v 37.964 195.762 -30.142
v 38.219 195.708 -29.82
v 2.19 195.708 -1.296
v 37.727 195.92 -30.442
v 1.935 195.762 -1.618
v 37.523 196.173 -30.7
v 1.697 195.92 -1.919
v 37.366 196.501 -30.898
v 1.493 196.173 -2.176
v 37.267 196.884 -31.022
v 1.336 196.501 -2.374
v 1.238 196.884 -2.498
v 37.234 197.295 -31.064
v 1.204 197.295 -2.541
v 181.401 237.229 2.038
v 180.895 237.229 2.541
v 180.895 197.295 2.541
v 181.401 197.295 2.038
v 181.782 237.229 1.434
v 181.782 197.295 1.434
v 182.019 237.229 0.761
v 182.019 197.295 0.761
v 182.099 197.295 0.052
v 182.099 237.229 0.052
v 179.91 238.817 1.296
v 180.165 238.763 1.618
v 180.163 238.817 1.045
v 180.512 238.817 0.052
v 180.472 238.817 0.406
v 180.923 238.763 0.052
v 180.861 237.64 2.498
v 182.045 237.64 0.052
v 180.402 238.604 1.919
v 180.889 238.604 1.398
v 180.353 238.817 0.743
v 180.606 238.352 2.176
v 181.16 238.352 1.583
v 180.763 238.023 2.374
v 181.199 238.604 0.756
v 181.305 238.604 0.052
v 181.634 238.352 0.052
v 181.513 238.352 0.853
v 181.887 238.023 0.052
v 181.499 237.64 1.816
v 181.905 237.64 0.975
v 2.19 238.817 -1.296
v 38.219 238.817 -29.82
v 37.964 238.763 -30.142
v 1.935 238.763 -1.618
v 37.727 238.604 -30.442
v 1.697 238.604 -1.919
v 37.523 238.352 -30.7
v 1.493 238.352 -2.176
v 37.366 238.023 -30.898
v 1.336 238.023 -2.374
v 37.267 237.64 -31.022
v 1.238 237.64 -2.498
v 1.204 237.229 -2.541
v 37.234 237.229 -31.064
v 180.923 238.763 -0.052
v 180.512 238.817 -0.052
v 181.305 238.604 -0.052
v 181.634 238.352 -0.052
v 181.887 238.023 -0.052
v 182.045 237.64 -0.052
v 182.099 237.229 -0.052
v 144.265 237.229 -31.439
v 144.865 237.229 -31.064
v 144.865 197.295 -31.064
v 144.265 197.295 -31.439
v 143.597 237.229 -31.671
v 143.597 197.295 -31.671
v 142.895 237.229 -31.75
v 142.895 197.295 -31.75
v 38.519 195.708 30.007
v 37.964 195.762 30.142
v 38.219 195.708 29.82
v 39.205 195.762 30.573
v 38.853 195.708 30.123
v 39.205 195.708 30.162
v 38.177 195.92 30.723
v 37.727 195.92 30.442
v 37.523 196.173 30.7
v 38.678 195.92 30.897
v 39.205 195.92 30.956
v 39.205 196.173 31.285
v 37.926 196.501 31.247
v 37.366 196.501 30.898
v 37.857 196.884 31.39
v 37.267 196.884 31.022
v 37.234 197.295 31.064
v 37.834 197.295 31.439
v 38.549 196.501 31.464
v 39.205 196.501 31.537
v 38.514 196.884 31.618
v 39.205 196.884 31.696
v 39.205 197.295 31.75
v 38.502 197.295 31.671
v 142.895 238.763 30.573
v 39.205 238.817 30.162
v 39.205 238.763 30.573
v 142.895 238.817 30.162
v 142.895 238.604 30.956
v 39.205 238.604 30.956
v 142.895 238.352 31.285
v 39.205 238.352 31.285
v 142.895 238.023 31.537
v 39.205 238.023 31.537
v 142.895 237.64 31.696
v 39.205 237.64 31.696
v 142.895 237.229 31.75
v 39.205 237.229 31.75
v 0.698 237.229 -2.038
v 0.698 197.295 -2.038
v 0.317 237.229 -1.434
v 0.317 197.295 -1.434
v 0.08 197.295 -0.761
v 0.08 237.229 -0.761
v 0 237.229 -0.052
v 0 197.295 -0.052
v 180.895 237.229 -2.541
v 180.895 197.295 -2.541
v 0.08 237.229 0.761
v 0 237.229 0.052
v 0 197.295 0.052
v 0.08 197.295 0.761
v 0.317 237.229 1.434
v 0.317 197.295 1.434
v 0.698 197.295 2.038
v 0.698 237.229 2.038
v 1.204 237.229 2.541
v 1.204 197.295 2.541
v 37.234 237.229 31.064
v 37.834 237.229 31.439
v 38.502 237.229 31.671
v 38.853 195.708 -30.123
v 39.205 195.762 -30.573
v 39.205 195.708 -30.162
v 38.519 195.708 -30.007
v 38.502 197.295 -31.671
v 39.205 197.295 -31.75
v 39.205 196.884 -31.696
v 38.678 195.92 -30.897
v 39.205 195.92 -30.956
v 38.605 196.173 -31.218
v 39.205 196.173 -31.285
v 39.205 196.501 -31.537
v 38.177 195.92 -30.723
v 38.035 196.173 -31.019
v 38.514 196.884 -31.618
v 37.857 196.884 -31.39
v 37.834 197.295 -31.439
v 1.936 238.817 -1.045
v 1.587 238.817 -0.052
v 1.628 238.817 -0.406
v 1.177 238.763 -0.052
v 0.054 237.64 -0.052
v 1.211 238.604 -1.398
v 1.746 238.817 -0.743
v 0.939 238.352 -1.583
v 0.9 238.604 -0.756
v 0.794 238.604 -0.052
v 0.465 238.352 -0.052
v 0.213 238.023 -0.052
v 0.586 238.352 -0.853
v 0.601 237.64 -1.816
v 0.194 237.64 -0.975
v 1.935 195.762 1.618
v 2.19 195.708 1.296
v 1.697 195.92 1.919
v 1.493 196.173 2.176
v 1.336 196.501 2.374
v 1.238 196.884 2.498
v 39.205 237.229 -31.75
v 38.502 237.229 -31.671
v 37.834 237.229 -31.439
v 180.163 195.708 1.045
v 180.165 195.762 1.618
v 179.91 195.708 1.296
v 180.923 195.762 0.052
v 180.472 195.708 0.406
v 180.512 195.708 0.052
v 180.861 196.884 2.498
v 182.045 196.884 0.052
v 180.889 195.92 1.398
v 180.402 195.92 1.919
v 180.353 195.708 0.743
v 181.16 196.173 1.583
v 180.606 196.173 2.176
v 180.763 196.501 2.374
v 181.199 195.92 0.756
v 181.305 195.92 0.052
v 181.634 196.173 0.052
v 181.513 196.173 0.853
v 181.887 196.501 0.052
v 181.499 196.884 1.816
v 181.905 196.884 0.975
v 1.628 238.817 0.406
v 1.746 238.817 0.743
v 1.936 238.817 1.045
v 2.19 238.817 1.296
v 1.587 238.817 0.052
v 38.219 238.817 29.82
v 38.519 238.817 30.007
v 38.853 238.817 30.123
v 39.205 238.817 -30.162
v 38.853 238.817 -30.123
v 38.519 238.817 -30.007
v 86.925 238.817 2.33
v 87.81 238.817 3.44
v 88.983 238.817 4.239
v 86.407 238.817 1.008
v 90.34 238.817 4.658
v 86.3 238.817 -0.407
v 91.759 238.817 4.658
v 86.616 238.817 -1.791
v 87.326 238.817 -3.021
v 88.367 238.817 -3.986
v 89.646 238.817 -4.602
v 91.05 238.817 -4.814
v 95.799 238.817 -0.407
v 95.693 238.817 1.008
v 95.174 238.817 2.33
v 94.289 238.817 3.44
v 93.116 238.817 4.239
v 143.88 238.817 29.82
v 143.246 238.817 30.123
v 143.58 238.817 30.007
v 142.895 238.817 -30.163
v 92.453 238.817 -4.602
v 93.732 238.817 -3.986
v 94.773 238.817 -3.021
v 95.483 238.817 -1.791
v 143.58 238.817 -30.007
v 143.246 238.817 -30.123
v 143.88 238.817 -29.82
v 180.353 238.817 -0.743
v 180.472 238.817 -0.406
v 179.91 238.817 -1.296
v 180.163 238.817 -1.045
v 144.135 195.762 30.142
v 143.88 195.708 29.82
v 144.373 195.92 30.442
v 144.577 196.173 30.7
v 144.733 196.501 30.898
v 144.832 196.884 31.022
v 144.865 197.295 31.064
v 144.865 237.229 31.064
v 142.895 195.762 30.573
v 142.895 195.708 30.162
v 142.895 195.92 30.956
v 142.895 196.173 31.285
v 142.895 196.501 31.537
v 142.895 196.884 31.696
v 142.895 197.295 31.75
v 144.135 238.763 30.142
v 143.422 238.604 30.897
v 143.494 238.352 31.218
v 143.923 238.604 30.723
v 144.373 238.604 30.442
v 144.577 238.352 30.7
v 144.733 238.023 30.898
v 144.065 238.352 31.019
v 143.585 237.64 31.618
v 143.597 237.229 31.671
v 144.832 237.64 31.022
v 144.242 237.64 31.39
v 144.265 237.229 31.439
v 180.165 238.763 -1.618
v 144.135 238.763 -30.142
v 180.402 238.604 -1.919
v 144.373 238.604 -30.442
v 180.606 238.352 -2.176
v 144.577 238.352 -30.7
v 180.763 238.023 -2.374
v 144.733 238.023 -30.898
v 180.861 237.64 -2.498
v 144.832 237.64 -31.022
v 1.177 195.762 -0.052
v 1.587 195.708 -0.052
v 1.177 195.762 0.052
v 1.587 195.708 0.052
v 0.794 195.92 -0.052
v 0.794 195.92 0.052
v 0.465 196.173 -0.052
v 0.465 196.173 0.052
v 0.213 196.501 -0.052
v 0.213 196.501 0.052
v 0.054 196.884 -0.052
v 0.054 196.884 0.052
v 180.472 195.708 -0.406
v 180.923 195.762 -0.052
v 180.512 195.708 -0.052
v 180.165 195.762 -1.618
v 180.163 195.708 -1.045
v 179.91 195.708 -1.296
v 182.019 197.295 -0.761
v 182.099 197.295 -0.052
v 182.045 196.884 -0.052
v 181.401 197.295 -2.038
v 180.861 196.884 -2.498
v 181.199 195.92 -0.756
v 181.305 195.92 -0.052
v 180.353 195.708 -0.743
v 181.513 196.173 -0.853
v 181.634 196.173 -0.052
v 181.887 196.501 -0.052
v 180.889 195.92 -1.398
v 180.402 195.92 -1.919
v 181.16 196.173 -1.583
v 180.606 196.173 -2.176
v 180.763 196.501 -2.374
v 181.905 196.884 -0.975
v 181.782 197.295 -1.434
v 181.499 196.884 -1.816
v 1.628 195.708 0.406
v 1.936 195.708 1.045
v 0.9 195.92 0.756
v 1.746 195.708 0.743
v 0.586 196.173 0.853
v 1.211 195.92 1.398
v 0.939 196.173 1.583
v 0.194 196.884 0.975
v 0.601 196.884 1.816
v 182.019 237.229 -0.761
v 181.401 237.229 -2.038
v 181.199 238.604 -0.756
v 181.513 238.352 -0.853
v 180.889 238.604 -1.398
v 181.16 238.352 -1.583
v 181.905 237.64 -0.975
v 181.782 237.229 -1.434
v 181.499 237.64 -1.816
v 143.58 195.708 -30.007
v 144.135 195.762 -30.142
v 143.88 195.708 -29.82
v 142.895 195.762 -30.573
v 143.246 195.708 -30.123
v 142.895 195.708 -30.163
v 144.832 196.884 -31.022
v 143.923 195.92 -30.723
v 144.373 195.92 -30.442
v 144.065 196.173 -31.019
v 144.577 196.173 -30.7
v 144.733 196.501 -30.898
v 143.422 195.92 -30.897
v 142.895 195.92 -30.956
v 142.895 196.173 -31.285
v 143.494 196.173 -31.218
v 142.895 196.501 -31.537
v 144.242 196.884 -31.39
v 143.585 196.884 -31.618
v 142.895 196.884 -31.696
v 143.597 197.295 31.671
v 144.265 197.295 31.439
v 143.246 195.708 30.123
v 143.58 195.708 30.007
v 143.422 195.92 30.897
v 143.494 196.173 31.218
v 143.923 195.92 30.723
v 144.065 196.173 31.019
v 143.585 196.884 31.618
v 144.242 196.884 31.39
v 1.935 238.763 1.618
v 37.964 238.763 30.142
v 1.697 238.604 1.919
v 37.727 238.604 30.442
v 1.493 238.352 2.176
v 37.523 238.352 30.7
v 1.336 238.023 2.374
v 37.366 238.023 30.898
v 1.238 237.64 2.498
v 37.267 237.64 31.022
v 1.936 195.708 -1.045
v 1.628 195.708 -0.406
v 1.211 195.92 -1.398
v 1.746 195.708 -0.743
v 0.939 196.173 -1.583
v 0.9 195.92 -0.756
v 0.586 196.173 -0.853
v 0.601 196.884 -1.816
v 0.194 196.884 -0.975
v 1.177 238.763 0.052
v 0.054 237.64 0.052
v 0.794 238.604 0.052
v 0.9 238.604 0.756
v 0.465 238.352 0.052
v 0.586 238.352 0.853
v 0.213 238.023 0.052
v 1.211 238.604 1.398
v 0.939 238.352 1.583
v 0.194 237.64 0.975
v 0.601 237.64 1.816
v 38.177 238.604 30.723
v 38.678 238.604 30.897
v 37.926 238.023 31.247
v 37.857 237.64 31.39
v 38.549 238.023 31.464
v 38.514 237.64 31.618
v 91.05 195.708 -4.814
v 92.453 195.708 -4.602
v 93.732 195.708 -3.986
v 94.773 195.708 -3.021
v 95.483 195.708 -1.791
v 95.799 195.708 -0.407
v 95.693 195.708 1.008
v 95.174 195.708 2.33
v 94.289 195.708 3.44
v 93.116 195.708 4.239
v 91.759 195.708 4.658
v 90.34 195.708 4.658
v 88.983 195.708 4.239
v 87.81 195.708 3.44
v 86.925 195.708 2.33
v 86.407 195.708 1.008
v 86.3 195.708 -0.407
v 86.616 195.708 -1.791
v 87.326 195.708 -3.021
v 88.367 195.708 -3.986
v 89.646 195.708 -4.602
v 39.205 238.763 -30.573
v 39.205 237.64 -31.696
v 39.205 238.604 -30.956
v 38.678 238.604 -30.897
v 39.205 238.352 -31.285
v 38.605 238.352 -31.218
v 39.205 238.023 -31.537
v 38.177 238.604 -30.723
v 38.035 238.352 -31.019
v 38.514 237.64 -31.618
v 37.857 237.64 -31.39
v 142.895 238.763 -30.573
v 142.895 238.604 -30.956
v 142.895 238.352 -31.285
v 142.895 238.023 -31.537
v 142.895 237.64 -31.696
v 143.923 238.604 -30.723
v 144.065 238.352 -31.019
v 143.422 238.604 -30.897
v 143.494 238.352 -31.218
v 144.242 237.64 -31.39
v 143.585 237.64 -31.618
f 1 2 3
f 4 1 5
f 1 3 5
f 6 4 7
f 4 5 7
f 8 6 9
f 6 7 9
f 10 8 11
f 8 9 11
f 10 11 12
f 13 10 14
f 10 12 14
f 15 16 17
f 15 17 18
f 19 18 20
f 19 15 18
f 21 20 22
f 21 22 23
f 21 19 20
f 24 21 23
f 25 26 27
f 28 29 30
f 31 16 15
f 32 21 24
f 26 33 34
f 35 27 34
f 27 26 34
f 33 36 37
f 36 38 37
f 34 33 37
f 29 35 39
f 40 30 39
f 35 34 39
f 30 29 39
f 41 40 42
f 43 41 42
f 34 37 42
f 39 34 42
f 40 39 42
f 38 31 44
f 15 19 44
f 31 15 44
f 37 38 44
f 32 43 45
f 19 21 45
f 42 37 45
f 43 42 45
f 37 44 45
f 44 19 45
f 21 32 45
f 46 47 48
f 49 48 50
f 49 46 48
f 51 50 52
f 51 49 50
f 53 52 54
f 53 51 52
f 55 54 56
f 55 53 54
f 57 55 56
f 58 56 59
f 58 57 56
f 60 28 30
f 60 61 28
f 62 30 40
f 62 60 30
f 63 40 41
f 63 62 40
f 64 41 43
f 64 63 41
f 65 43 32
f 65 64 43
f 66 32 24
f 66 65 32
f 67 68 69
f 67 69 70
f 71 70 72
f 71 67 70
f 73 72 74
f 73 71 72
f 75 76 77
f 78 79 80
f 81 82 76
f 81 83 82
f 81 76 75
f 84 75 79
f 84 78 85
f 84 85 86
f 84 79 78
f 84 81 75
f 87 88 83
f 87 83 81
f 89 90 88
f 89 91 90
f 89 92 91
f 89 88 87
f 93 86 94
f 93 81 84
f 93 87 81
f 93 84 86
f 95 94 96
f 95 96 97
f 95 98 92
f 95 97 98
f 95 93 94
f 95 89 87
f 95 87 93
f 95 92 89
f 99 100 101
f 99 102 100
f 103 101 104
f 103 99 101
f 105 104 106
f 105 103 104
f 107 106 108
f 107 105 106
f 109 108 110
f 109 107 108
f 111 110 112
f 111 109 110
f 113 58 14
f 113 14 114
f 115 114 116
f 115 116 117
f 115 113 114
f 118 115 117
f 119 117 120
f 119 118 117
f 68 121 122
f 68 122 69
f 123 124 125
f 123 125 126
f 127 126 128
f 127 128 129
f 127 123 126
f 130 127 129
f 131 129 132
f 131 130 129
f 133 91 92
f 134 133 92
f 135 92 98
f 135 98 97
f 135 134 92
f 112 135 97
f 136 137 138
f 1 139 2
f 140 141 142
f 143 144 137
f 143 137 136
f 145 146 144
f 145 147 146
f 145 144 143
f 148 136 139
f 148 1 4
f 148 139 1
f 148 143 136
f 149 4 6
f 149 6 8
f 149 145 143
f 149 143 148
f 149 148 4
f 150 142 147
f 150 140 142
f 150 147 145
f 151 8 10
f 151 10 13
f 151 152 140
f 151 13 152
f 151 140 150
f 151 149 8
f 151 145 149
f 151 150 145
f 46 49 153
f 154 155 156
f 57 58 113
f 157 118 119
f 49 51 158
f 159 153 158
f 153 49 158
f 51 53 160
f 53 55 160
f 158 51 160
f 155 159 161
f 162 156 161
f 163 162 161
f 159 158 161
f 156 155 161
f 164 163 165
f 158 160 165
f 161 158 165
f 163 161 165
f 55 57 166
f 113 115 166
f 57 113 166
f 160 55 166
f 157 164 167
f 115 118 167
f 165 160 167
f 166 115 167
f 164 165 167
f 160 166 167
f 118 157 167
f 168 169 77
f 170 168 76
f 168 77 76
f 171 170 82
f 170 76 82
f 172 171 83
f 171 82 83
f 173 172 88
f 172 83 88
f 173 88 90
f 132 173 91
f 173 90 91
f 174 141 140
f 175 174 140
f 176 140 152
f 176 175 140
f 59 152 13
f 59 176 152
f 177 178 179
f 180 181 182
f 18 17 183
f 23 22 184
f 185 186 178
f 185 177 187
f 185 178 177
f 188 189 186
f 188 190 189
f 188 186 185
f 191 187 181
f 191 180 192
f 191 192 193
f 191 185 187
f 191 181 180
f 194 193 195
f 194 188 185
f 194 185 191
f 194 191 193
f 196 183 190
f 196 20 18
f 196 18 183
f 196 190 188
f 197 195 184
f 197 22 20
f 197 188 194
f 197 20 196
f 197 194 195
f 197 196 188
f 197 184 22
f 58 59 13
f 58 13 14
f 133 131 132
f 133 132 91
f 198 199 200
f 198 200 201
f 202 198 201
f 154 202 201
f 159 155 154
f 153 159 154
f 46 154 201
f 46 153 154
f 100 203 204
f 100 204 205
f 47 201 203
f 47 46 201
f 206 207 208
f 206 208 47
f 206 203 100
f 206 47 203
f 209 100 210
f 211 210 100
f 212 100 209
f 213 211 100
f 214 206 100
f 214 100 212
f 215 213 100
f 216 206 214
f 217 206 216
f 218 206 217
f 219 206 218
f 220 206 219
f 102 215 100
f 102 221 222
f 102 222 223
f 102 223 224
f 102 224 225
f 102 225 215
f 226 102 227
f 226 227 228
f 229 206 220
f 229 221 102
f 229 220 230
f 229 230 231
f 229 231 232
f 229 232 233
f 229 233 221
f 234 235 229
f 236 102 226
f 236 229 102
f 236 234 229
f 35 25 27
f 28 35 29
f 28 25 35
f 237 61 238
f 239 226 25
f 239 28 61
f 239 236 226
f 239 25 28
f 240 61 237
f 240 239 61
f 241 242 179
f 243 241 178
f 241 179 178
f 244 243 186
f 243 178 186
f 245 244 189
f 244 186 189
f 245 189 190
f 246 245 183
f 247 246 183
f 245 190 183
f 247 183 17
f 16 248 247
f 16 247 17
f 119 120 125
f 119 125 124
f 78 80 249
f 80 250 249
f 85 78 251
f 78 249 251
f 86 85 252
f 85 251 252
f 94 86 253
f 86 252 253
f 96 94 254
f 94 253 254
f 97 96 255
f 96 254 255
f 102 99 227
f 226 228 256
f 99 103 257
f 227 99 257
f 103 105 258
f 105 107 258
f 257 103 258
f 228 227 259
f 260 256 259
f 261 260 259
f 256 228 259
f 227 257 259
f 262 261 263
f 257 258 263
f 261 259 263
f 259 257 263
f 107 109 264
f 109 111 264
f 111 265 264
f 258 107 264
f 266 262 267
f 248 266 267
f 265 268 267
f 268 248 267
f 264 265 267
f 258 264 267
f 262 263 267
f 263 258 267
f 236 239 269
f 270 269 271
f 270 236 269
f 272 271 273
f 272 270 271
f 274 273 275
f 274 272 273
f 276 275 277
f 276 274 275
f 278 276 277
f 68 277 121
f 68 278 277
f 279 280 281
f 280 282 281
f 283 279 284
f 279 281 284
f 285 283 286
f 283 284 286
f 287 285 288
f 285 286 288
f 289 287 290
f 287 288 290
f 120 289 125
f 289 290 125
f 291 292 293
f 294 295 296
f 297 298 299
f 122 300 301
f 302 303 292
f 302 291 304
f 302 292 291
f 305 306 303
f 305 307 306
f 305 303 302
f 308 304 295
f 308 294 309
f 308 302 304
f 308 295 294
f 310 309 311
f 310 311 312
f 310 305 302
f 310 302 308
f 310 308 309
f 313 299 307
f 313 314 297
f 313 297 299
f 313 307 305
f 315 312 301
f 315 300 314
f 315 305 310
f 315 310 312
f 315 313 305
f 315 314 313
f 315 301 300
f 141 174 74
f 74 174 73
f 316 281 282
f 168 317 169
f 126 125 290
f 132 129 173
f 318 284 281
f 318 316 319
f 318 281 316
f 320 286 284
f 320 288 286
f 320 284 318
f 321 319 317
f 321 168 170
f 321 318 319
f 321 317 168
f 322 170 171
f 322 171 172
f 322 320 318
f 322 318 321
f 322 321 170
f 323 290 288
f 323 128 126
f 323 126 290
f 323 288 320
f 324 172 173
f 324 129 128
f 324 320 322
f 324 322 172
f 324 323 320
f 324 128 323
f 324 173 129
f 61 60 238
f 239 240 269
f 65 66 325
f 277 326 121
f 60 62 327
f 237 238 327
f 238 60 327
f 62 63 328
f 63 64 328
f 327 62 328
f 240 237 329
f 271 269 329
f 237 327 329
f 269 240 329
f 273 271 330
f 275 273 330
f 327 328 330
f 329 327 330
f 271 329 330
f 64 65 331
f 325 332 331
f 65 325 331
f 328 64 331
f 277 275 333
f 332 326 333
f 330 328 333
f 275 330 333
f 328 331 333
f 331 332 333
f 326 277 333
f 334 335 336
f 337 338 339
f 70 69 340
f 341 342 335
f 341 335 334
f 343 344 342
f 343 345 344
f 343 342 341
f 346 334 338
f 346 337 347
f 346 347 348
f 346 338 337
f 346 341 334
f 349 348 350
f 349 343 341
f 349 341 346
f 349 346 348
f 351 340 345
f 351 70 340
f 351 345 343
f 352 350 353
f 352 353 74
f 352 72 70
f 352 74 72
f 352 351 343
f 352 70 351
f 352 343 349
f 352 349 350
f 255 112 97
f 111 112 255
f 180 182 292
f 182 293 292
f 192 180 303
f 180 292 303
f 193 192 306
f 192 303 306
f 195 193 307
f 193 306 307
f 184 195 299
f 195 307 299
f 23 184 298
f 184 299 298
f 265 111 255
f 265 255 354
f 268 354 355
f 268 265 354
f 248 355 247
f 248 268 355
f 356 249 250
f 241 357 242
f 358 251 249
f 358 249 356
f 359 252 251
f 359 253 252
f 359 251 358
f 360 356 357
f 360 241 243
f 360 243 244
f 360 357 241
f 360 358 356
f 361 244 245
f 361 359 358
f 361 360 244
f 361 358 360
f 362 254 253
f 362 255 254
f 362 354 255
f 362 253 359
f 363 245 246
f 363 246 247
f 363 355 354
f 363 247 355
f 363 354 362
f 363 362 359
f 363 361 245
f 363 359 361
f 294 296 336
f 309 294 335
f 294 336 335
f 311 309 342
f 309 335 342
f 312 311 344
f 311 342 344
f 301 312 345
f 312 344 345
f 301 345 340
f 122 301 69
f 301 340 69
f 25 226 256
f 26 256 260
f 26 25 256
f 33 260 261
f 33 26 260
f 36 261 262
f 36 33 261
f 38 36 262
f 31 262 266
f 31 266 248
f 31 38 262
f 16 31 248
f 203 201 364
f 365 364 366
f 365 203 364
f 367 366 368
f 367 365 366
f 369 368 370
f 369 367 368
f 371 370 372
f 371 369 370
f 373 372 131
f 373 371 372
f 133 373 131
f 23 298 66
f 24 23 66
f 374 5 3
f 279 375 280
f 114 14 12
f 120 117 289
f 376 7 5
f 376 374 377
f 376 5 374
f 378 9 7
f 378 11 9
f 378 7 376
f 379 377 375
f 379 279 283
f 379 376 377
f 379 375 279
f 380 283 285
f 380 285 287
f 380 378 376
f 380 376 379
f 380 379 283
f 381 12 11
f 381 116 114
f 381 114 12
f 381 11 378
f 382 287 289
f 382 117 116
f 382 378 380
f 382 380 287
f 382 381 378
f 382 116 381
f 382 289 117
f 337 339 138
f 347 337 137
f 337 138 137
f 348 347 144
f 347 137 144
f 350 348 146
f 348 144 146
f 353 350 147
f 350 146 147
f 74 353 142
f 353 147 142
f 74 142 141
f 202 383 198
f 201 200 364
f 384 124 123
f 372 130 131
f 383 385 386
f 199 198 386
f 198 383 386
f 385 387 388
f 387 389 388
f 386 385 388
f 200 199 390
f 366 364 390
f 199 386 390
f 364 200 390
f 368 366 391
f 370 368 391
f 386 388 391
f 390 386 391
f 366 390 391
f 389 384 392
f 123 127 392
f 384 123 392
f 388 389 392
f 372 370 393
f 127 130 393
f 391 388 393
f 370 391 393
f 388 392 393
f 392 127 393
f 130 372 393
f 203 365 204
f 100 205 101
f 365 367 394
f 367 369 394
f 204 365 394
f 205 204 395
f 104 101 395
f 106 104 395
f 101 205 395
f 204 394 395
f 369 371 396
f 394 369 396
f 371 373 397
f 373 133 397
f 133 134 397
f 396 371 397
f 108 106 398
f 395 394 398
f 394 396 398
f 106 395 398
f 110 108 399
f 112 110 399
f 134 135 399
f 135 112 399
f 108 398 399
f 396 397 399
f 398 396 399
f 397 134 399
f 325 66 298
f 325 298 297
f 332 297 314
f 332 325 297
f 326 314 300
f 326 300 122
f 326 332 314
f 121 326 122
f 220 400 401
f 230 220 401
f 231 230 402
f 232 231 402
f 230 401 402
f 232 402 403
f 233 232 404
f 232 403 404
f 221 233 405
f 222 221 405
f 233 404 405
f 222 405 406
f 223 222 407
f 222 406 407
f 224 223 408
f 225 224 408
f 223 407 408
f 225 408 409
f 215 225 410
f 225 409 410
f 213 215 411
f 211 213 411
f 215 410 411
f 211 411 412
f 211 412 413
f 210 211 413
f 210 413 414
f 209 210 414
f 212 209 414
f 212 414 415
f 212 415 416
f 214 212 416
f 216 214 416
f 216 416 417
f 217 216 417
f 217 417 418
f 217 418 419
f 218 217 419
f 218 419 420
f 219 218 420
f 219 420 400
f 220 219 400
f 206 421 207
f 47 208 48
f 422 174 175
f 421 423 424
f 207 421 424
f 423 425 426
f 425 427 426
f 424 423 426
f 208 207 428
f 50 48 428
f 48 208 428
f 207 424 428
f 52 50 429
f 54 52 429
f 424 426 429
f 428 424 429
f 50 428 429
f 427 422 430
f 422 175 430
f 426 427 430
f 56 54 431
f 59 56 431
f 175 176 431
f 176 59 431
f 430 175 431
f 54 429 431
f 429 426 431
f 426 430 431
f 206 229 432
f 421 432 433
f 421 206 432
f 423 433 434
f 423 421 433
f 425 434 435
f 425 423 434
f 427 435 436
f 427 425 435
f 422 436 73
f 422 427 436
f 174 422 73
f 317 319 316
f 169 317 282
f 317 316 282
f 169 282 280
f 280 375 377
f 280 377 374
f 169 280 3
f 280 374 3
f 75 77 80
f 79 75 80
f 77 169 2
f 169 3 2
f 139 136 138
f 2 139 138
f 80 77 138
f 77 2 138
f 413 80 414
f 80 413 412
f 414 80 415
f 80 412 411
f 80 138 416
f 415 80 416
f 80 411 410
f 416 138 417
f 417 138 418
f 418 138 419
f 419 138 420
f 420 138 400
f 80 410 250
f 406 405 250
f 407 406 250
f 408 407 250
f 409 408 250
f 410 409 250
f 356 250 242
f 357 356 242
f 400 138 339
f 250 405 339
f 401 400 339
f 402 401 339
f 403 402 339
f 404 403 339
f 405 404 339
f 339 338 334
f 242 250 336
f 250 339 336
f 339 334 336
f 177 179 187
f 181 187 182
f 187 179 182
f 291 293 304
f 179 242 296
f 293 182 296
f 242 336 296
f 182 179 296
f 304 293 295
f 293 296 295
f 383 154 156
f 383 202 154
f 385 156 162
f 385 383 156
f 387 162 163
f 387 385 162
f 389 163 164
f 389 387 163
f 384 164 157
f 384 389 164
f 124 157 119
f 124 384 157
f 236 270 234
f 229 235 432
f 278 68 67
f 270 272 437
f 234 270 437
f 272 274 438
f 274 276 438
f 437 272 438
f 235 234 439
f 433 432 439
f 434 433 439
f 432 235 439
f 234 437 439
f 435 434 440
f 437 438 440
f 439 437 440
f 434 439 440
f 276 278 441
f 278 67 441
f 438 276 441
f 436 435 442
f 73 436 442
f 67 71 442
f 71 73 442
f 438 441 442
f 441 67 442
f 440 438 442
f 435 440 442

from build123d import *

# Parameters (mm, degrees)
BOSS_EXTRUDE1_DEPTH      = 31.75
BOSS_EXTRUDE1_DEPTH_BACK = 31.75
SKETCH1_W                = 182.099207872
SKETCH1_H                = 43.109258089
SKETCH2_W                = 205.659157106
SKETCH2_H                = 99.146034208
CUT_EXTRUDE1_DEPTH       = 190.806723118
SKETCH3_R                = 4.7625
CUT_EXTRUDE2_DEPTH       = 190.806723118
FILLET1_R                = 1.5875


with BuildPart() as part:
    # Sketch1 → Boss-Extrude1 (new, two sides: drawn at the far end of the back side and taken through both)
    with BuildSketch(Plane.XY.offset(-BOSS_EXTRUDE1_DEPTH_BACK)):
        with Locations((91.049603936, 217.262286974)):
            Rectangle(SKETCH1_W, SKETCH1_H)
    extrude(amount=BOSS_EXTRUDE1_DEPTH + BOSS_EXTRUDE1_DEPTH_BACK)

    # Sketch2 → Cut-Extrude1 (cut, through all)
    with BuildSketch(Plane(origin=(0, 238.816916018, 0), x_dir=(1, 0, 0), z_dir=(0, 1, 0))):
        with Locations((89.350434008, 0.474866742)):
            Rectangle(SKETCH2_W, SKETCH2_H)
        with BuildLine():
            Line((1.204268152, -2.540878953), (37.233910096, -31.064345493))
            ThreePointArc((37.233910096, -31.064345493), (38.161341158, -31.573691126), (39.204641944, -31.75))
            Line((39.204641944, -31.75), (142.894565928, -31.75))
            ThreePointArc((142.894565928, -31.75), (143.937866714, -31.573691126), (144.865297776, -31.064345493))
            Line((144.865297776, -31.064345493), (180.894939721, -2.540878953))
            ThreePointArc((180.894939721, -2.540878953), (181.782327763, -1.43420323), (182.099207872, -0.051533461))
            Line((182.099207872, -0.051533461), (182.099207872, 0.051533461))
            ThreePointArc((182.099207872, 0.051533461), (181.782327763, 1.43420323), (180.894939721, 2.540878953))
            Line((180.894939721, 2.540878953), (144.865297776, 31.064345493))
            ThreePointArc((144.865297776, 31.064345493), (143.937866714, 31.573691126), (142.894565928, 31.75))
            Line((142.894565928, 31.75), (39.204641944, 31.75))
            ThreePointArc((39.204641944, 31.75), (38.161341158, 31.573691126), (37.233910096, 31.064345493))
            Line((37.233910096, 31.064345493), (1.204268152, 2.540878953))
            ThreePointArc((1.204268152, 2.540878953), (0.316880109, 1.43420323), (0, 0.051533461))
            Line((0, 0.051533461), (0, -0.051533461))
            ThreePointArc((0, -0.051533461), (0.316880109, -1.43420323), (1.204268152, -2.540878953))
        make_face(mode=Mode.SUBTRACT)
    extrude(amount=-CUT_EXTRUDE1_DEPTH, mode=Mode.SUBTRACT)

    # Sketch3 → Cut-Extrude2 (cut, through all)
    with BuildSketch(Plane.XZ.offset(-195.707657929)):
        with Locations((91.049603936, -0.051533461)):
            Circle(SKETCH3_R)
    extrude(amount=-CUT_EXTRUDE2_DEPTH, mode=Mode.SUBTRACT)

    # Fillet1
    fillet1_edges = [part.edges().sort_by_distance(p)[0] for p in [
        (143.937866714, 238.816916018, 31.573691126),
        (162.880118749, 238.816916018, 16.802612223),
        (181.782327763, 238.816916018, 1.43420323),
        (182.099207872, 238.816916018, 0),
        (181.782327763, 238.816916018, -1.43420323),
        (162.880118749, 238.816916018, -16.802612223),
        (143.937866714, 238.816916018, -31.573691126),
        (91.049603936, 238.816916018, -31.75),
        (38.161341158, 238.816916018, -31.573691126),
        (19.219089124, 238.816916018, -16.802612223),
        (0.316880109, 238.816916018, -1.43420323),
        (0, 238.816916018, 0),
        (0.316880109, 238.816916018, 1.43420323),
        (19.219089124, 238.816916018, 16.802612223),
        (38.161341158, 238.816916018, 31.573691126),
        (38.161341158, 195.707657929, 31.573691126),
        (19.219089124, 195.707657929, 16.802612223),
        (0.316880109, 195.707657929, 1.43420323),
        (0, 195.707657929, 0),
        (0.316880109, 195.707657929, -1.43420323),
        (19.219089124, 195.707657929, -16.802612223),
        (38.161341158, 195.707657929, -31.573691126),
        (91.049603936, 195.707657929, -31.75),
        (143.937866714, 195.707657929, -31.573691126),
        (162.880118749, 195.707657929, -16.802612223),
        (181.782327763, 195.707657929, -1.43420323),
        (182.099207872, 195.707657929, 0),
        (181.782327763, 195.707657929, 1.43420323),
        (162.880118749, 195.707657929, 16.802612223),
        (143.937866714, 195.707657929, 31.573691126),
        (91.049603936, 238.816916018, 31.75),
        (91.049603936, 195.707657929, 31.75),
    ]]
    fillet(fillet1_edges, radius=FILLET1_R)


solid = part.part
